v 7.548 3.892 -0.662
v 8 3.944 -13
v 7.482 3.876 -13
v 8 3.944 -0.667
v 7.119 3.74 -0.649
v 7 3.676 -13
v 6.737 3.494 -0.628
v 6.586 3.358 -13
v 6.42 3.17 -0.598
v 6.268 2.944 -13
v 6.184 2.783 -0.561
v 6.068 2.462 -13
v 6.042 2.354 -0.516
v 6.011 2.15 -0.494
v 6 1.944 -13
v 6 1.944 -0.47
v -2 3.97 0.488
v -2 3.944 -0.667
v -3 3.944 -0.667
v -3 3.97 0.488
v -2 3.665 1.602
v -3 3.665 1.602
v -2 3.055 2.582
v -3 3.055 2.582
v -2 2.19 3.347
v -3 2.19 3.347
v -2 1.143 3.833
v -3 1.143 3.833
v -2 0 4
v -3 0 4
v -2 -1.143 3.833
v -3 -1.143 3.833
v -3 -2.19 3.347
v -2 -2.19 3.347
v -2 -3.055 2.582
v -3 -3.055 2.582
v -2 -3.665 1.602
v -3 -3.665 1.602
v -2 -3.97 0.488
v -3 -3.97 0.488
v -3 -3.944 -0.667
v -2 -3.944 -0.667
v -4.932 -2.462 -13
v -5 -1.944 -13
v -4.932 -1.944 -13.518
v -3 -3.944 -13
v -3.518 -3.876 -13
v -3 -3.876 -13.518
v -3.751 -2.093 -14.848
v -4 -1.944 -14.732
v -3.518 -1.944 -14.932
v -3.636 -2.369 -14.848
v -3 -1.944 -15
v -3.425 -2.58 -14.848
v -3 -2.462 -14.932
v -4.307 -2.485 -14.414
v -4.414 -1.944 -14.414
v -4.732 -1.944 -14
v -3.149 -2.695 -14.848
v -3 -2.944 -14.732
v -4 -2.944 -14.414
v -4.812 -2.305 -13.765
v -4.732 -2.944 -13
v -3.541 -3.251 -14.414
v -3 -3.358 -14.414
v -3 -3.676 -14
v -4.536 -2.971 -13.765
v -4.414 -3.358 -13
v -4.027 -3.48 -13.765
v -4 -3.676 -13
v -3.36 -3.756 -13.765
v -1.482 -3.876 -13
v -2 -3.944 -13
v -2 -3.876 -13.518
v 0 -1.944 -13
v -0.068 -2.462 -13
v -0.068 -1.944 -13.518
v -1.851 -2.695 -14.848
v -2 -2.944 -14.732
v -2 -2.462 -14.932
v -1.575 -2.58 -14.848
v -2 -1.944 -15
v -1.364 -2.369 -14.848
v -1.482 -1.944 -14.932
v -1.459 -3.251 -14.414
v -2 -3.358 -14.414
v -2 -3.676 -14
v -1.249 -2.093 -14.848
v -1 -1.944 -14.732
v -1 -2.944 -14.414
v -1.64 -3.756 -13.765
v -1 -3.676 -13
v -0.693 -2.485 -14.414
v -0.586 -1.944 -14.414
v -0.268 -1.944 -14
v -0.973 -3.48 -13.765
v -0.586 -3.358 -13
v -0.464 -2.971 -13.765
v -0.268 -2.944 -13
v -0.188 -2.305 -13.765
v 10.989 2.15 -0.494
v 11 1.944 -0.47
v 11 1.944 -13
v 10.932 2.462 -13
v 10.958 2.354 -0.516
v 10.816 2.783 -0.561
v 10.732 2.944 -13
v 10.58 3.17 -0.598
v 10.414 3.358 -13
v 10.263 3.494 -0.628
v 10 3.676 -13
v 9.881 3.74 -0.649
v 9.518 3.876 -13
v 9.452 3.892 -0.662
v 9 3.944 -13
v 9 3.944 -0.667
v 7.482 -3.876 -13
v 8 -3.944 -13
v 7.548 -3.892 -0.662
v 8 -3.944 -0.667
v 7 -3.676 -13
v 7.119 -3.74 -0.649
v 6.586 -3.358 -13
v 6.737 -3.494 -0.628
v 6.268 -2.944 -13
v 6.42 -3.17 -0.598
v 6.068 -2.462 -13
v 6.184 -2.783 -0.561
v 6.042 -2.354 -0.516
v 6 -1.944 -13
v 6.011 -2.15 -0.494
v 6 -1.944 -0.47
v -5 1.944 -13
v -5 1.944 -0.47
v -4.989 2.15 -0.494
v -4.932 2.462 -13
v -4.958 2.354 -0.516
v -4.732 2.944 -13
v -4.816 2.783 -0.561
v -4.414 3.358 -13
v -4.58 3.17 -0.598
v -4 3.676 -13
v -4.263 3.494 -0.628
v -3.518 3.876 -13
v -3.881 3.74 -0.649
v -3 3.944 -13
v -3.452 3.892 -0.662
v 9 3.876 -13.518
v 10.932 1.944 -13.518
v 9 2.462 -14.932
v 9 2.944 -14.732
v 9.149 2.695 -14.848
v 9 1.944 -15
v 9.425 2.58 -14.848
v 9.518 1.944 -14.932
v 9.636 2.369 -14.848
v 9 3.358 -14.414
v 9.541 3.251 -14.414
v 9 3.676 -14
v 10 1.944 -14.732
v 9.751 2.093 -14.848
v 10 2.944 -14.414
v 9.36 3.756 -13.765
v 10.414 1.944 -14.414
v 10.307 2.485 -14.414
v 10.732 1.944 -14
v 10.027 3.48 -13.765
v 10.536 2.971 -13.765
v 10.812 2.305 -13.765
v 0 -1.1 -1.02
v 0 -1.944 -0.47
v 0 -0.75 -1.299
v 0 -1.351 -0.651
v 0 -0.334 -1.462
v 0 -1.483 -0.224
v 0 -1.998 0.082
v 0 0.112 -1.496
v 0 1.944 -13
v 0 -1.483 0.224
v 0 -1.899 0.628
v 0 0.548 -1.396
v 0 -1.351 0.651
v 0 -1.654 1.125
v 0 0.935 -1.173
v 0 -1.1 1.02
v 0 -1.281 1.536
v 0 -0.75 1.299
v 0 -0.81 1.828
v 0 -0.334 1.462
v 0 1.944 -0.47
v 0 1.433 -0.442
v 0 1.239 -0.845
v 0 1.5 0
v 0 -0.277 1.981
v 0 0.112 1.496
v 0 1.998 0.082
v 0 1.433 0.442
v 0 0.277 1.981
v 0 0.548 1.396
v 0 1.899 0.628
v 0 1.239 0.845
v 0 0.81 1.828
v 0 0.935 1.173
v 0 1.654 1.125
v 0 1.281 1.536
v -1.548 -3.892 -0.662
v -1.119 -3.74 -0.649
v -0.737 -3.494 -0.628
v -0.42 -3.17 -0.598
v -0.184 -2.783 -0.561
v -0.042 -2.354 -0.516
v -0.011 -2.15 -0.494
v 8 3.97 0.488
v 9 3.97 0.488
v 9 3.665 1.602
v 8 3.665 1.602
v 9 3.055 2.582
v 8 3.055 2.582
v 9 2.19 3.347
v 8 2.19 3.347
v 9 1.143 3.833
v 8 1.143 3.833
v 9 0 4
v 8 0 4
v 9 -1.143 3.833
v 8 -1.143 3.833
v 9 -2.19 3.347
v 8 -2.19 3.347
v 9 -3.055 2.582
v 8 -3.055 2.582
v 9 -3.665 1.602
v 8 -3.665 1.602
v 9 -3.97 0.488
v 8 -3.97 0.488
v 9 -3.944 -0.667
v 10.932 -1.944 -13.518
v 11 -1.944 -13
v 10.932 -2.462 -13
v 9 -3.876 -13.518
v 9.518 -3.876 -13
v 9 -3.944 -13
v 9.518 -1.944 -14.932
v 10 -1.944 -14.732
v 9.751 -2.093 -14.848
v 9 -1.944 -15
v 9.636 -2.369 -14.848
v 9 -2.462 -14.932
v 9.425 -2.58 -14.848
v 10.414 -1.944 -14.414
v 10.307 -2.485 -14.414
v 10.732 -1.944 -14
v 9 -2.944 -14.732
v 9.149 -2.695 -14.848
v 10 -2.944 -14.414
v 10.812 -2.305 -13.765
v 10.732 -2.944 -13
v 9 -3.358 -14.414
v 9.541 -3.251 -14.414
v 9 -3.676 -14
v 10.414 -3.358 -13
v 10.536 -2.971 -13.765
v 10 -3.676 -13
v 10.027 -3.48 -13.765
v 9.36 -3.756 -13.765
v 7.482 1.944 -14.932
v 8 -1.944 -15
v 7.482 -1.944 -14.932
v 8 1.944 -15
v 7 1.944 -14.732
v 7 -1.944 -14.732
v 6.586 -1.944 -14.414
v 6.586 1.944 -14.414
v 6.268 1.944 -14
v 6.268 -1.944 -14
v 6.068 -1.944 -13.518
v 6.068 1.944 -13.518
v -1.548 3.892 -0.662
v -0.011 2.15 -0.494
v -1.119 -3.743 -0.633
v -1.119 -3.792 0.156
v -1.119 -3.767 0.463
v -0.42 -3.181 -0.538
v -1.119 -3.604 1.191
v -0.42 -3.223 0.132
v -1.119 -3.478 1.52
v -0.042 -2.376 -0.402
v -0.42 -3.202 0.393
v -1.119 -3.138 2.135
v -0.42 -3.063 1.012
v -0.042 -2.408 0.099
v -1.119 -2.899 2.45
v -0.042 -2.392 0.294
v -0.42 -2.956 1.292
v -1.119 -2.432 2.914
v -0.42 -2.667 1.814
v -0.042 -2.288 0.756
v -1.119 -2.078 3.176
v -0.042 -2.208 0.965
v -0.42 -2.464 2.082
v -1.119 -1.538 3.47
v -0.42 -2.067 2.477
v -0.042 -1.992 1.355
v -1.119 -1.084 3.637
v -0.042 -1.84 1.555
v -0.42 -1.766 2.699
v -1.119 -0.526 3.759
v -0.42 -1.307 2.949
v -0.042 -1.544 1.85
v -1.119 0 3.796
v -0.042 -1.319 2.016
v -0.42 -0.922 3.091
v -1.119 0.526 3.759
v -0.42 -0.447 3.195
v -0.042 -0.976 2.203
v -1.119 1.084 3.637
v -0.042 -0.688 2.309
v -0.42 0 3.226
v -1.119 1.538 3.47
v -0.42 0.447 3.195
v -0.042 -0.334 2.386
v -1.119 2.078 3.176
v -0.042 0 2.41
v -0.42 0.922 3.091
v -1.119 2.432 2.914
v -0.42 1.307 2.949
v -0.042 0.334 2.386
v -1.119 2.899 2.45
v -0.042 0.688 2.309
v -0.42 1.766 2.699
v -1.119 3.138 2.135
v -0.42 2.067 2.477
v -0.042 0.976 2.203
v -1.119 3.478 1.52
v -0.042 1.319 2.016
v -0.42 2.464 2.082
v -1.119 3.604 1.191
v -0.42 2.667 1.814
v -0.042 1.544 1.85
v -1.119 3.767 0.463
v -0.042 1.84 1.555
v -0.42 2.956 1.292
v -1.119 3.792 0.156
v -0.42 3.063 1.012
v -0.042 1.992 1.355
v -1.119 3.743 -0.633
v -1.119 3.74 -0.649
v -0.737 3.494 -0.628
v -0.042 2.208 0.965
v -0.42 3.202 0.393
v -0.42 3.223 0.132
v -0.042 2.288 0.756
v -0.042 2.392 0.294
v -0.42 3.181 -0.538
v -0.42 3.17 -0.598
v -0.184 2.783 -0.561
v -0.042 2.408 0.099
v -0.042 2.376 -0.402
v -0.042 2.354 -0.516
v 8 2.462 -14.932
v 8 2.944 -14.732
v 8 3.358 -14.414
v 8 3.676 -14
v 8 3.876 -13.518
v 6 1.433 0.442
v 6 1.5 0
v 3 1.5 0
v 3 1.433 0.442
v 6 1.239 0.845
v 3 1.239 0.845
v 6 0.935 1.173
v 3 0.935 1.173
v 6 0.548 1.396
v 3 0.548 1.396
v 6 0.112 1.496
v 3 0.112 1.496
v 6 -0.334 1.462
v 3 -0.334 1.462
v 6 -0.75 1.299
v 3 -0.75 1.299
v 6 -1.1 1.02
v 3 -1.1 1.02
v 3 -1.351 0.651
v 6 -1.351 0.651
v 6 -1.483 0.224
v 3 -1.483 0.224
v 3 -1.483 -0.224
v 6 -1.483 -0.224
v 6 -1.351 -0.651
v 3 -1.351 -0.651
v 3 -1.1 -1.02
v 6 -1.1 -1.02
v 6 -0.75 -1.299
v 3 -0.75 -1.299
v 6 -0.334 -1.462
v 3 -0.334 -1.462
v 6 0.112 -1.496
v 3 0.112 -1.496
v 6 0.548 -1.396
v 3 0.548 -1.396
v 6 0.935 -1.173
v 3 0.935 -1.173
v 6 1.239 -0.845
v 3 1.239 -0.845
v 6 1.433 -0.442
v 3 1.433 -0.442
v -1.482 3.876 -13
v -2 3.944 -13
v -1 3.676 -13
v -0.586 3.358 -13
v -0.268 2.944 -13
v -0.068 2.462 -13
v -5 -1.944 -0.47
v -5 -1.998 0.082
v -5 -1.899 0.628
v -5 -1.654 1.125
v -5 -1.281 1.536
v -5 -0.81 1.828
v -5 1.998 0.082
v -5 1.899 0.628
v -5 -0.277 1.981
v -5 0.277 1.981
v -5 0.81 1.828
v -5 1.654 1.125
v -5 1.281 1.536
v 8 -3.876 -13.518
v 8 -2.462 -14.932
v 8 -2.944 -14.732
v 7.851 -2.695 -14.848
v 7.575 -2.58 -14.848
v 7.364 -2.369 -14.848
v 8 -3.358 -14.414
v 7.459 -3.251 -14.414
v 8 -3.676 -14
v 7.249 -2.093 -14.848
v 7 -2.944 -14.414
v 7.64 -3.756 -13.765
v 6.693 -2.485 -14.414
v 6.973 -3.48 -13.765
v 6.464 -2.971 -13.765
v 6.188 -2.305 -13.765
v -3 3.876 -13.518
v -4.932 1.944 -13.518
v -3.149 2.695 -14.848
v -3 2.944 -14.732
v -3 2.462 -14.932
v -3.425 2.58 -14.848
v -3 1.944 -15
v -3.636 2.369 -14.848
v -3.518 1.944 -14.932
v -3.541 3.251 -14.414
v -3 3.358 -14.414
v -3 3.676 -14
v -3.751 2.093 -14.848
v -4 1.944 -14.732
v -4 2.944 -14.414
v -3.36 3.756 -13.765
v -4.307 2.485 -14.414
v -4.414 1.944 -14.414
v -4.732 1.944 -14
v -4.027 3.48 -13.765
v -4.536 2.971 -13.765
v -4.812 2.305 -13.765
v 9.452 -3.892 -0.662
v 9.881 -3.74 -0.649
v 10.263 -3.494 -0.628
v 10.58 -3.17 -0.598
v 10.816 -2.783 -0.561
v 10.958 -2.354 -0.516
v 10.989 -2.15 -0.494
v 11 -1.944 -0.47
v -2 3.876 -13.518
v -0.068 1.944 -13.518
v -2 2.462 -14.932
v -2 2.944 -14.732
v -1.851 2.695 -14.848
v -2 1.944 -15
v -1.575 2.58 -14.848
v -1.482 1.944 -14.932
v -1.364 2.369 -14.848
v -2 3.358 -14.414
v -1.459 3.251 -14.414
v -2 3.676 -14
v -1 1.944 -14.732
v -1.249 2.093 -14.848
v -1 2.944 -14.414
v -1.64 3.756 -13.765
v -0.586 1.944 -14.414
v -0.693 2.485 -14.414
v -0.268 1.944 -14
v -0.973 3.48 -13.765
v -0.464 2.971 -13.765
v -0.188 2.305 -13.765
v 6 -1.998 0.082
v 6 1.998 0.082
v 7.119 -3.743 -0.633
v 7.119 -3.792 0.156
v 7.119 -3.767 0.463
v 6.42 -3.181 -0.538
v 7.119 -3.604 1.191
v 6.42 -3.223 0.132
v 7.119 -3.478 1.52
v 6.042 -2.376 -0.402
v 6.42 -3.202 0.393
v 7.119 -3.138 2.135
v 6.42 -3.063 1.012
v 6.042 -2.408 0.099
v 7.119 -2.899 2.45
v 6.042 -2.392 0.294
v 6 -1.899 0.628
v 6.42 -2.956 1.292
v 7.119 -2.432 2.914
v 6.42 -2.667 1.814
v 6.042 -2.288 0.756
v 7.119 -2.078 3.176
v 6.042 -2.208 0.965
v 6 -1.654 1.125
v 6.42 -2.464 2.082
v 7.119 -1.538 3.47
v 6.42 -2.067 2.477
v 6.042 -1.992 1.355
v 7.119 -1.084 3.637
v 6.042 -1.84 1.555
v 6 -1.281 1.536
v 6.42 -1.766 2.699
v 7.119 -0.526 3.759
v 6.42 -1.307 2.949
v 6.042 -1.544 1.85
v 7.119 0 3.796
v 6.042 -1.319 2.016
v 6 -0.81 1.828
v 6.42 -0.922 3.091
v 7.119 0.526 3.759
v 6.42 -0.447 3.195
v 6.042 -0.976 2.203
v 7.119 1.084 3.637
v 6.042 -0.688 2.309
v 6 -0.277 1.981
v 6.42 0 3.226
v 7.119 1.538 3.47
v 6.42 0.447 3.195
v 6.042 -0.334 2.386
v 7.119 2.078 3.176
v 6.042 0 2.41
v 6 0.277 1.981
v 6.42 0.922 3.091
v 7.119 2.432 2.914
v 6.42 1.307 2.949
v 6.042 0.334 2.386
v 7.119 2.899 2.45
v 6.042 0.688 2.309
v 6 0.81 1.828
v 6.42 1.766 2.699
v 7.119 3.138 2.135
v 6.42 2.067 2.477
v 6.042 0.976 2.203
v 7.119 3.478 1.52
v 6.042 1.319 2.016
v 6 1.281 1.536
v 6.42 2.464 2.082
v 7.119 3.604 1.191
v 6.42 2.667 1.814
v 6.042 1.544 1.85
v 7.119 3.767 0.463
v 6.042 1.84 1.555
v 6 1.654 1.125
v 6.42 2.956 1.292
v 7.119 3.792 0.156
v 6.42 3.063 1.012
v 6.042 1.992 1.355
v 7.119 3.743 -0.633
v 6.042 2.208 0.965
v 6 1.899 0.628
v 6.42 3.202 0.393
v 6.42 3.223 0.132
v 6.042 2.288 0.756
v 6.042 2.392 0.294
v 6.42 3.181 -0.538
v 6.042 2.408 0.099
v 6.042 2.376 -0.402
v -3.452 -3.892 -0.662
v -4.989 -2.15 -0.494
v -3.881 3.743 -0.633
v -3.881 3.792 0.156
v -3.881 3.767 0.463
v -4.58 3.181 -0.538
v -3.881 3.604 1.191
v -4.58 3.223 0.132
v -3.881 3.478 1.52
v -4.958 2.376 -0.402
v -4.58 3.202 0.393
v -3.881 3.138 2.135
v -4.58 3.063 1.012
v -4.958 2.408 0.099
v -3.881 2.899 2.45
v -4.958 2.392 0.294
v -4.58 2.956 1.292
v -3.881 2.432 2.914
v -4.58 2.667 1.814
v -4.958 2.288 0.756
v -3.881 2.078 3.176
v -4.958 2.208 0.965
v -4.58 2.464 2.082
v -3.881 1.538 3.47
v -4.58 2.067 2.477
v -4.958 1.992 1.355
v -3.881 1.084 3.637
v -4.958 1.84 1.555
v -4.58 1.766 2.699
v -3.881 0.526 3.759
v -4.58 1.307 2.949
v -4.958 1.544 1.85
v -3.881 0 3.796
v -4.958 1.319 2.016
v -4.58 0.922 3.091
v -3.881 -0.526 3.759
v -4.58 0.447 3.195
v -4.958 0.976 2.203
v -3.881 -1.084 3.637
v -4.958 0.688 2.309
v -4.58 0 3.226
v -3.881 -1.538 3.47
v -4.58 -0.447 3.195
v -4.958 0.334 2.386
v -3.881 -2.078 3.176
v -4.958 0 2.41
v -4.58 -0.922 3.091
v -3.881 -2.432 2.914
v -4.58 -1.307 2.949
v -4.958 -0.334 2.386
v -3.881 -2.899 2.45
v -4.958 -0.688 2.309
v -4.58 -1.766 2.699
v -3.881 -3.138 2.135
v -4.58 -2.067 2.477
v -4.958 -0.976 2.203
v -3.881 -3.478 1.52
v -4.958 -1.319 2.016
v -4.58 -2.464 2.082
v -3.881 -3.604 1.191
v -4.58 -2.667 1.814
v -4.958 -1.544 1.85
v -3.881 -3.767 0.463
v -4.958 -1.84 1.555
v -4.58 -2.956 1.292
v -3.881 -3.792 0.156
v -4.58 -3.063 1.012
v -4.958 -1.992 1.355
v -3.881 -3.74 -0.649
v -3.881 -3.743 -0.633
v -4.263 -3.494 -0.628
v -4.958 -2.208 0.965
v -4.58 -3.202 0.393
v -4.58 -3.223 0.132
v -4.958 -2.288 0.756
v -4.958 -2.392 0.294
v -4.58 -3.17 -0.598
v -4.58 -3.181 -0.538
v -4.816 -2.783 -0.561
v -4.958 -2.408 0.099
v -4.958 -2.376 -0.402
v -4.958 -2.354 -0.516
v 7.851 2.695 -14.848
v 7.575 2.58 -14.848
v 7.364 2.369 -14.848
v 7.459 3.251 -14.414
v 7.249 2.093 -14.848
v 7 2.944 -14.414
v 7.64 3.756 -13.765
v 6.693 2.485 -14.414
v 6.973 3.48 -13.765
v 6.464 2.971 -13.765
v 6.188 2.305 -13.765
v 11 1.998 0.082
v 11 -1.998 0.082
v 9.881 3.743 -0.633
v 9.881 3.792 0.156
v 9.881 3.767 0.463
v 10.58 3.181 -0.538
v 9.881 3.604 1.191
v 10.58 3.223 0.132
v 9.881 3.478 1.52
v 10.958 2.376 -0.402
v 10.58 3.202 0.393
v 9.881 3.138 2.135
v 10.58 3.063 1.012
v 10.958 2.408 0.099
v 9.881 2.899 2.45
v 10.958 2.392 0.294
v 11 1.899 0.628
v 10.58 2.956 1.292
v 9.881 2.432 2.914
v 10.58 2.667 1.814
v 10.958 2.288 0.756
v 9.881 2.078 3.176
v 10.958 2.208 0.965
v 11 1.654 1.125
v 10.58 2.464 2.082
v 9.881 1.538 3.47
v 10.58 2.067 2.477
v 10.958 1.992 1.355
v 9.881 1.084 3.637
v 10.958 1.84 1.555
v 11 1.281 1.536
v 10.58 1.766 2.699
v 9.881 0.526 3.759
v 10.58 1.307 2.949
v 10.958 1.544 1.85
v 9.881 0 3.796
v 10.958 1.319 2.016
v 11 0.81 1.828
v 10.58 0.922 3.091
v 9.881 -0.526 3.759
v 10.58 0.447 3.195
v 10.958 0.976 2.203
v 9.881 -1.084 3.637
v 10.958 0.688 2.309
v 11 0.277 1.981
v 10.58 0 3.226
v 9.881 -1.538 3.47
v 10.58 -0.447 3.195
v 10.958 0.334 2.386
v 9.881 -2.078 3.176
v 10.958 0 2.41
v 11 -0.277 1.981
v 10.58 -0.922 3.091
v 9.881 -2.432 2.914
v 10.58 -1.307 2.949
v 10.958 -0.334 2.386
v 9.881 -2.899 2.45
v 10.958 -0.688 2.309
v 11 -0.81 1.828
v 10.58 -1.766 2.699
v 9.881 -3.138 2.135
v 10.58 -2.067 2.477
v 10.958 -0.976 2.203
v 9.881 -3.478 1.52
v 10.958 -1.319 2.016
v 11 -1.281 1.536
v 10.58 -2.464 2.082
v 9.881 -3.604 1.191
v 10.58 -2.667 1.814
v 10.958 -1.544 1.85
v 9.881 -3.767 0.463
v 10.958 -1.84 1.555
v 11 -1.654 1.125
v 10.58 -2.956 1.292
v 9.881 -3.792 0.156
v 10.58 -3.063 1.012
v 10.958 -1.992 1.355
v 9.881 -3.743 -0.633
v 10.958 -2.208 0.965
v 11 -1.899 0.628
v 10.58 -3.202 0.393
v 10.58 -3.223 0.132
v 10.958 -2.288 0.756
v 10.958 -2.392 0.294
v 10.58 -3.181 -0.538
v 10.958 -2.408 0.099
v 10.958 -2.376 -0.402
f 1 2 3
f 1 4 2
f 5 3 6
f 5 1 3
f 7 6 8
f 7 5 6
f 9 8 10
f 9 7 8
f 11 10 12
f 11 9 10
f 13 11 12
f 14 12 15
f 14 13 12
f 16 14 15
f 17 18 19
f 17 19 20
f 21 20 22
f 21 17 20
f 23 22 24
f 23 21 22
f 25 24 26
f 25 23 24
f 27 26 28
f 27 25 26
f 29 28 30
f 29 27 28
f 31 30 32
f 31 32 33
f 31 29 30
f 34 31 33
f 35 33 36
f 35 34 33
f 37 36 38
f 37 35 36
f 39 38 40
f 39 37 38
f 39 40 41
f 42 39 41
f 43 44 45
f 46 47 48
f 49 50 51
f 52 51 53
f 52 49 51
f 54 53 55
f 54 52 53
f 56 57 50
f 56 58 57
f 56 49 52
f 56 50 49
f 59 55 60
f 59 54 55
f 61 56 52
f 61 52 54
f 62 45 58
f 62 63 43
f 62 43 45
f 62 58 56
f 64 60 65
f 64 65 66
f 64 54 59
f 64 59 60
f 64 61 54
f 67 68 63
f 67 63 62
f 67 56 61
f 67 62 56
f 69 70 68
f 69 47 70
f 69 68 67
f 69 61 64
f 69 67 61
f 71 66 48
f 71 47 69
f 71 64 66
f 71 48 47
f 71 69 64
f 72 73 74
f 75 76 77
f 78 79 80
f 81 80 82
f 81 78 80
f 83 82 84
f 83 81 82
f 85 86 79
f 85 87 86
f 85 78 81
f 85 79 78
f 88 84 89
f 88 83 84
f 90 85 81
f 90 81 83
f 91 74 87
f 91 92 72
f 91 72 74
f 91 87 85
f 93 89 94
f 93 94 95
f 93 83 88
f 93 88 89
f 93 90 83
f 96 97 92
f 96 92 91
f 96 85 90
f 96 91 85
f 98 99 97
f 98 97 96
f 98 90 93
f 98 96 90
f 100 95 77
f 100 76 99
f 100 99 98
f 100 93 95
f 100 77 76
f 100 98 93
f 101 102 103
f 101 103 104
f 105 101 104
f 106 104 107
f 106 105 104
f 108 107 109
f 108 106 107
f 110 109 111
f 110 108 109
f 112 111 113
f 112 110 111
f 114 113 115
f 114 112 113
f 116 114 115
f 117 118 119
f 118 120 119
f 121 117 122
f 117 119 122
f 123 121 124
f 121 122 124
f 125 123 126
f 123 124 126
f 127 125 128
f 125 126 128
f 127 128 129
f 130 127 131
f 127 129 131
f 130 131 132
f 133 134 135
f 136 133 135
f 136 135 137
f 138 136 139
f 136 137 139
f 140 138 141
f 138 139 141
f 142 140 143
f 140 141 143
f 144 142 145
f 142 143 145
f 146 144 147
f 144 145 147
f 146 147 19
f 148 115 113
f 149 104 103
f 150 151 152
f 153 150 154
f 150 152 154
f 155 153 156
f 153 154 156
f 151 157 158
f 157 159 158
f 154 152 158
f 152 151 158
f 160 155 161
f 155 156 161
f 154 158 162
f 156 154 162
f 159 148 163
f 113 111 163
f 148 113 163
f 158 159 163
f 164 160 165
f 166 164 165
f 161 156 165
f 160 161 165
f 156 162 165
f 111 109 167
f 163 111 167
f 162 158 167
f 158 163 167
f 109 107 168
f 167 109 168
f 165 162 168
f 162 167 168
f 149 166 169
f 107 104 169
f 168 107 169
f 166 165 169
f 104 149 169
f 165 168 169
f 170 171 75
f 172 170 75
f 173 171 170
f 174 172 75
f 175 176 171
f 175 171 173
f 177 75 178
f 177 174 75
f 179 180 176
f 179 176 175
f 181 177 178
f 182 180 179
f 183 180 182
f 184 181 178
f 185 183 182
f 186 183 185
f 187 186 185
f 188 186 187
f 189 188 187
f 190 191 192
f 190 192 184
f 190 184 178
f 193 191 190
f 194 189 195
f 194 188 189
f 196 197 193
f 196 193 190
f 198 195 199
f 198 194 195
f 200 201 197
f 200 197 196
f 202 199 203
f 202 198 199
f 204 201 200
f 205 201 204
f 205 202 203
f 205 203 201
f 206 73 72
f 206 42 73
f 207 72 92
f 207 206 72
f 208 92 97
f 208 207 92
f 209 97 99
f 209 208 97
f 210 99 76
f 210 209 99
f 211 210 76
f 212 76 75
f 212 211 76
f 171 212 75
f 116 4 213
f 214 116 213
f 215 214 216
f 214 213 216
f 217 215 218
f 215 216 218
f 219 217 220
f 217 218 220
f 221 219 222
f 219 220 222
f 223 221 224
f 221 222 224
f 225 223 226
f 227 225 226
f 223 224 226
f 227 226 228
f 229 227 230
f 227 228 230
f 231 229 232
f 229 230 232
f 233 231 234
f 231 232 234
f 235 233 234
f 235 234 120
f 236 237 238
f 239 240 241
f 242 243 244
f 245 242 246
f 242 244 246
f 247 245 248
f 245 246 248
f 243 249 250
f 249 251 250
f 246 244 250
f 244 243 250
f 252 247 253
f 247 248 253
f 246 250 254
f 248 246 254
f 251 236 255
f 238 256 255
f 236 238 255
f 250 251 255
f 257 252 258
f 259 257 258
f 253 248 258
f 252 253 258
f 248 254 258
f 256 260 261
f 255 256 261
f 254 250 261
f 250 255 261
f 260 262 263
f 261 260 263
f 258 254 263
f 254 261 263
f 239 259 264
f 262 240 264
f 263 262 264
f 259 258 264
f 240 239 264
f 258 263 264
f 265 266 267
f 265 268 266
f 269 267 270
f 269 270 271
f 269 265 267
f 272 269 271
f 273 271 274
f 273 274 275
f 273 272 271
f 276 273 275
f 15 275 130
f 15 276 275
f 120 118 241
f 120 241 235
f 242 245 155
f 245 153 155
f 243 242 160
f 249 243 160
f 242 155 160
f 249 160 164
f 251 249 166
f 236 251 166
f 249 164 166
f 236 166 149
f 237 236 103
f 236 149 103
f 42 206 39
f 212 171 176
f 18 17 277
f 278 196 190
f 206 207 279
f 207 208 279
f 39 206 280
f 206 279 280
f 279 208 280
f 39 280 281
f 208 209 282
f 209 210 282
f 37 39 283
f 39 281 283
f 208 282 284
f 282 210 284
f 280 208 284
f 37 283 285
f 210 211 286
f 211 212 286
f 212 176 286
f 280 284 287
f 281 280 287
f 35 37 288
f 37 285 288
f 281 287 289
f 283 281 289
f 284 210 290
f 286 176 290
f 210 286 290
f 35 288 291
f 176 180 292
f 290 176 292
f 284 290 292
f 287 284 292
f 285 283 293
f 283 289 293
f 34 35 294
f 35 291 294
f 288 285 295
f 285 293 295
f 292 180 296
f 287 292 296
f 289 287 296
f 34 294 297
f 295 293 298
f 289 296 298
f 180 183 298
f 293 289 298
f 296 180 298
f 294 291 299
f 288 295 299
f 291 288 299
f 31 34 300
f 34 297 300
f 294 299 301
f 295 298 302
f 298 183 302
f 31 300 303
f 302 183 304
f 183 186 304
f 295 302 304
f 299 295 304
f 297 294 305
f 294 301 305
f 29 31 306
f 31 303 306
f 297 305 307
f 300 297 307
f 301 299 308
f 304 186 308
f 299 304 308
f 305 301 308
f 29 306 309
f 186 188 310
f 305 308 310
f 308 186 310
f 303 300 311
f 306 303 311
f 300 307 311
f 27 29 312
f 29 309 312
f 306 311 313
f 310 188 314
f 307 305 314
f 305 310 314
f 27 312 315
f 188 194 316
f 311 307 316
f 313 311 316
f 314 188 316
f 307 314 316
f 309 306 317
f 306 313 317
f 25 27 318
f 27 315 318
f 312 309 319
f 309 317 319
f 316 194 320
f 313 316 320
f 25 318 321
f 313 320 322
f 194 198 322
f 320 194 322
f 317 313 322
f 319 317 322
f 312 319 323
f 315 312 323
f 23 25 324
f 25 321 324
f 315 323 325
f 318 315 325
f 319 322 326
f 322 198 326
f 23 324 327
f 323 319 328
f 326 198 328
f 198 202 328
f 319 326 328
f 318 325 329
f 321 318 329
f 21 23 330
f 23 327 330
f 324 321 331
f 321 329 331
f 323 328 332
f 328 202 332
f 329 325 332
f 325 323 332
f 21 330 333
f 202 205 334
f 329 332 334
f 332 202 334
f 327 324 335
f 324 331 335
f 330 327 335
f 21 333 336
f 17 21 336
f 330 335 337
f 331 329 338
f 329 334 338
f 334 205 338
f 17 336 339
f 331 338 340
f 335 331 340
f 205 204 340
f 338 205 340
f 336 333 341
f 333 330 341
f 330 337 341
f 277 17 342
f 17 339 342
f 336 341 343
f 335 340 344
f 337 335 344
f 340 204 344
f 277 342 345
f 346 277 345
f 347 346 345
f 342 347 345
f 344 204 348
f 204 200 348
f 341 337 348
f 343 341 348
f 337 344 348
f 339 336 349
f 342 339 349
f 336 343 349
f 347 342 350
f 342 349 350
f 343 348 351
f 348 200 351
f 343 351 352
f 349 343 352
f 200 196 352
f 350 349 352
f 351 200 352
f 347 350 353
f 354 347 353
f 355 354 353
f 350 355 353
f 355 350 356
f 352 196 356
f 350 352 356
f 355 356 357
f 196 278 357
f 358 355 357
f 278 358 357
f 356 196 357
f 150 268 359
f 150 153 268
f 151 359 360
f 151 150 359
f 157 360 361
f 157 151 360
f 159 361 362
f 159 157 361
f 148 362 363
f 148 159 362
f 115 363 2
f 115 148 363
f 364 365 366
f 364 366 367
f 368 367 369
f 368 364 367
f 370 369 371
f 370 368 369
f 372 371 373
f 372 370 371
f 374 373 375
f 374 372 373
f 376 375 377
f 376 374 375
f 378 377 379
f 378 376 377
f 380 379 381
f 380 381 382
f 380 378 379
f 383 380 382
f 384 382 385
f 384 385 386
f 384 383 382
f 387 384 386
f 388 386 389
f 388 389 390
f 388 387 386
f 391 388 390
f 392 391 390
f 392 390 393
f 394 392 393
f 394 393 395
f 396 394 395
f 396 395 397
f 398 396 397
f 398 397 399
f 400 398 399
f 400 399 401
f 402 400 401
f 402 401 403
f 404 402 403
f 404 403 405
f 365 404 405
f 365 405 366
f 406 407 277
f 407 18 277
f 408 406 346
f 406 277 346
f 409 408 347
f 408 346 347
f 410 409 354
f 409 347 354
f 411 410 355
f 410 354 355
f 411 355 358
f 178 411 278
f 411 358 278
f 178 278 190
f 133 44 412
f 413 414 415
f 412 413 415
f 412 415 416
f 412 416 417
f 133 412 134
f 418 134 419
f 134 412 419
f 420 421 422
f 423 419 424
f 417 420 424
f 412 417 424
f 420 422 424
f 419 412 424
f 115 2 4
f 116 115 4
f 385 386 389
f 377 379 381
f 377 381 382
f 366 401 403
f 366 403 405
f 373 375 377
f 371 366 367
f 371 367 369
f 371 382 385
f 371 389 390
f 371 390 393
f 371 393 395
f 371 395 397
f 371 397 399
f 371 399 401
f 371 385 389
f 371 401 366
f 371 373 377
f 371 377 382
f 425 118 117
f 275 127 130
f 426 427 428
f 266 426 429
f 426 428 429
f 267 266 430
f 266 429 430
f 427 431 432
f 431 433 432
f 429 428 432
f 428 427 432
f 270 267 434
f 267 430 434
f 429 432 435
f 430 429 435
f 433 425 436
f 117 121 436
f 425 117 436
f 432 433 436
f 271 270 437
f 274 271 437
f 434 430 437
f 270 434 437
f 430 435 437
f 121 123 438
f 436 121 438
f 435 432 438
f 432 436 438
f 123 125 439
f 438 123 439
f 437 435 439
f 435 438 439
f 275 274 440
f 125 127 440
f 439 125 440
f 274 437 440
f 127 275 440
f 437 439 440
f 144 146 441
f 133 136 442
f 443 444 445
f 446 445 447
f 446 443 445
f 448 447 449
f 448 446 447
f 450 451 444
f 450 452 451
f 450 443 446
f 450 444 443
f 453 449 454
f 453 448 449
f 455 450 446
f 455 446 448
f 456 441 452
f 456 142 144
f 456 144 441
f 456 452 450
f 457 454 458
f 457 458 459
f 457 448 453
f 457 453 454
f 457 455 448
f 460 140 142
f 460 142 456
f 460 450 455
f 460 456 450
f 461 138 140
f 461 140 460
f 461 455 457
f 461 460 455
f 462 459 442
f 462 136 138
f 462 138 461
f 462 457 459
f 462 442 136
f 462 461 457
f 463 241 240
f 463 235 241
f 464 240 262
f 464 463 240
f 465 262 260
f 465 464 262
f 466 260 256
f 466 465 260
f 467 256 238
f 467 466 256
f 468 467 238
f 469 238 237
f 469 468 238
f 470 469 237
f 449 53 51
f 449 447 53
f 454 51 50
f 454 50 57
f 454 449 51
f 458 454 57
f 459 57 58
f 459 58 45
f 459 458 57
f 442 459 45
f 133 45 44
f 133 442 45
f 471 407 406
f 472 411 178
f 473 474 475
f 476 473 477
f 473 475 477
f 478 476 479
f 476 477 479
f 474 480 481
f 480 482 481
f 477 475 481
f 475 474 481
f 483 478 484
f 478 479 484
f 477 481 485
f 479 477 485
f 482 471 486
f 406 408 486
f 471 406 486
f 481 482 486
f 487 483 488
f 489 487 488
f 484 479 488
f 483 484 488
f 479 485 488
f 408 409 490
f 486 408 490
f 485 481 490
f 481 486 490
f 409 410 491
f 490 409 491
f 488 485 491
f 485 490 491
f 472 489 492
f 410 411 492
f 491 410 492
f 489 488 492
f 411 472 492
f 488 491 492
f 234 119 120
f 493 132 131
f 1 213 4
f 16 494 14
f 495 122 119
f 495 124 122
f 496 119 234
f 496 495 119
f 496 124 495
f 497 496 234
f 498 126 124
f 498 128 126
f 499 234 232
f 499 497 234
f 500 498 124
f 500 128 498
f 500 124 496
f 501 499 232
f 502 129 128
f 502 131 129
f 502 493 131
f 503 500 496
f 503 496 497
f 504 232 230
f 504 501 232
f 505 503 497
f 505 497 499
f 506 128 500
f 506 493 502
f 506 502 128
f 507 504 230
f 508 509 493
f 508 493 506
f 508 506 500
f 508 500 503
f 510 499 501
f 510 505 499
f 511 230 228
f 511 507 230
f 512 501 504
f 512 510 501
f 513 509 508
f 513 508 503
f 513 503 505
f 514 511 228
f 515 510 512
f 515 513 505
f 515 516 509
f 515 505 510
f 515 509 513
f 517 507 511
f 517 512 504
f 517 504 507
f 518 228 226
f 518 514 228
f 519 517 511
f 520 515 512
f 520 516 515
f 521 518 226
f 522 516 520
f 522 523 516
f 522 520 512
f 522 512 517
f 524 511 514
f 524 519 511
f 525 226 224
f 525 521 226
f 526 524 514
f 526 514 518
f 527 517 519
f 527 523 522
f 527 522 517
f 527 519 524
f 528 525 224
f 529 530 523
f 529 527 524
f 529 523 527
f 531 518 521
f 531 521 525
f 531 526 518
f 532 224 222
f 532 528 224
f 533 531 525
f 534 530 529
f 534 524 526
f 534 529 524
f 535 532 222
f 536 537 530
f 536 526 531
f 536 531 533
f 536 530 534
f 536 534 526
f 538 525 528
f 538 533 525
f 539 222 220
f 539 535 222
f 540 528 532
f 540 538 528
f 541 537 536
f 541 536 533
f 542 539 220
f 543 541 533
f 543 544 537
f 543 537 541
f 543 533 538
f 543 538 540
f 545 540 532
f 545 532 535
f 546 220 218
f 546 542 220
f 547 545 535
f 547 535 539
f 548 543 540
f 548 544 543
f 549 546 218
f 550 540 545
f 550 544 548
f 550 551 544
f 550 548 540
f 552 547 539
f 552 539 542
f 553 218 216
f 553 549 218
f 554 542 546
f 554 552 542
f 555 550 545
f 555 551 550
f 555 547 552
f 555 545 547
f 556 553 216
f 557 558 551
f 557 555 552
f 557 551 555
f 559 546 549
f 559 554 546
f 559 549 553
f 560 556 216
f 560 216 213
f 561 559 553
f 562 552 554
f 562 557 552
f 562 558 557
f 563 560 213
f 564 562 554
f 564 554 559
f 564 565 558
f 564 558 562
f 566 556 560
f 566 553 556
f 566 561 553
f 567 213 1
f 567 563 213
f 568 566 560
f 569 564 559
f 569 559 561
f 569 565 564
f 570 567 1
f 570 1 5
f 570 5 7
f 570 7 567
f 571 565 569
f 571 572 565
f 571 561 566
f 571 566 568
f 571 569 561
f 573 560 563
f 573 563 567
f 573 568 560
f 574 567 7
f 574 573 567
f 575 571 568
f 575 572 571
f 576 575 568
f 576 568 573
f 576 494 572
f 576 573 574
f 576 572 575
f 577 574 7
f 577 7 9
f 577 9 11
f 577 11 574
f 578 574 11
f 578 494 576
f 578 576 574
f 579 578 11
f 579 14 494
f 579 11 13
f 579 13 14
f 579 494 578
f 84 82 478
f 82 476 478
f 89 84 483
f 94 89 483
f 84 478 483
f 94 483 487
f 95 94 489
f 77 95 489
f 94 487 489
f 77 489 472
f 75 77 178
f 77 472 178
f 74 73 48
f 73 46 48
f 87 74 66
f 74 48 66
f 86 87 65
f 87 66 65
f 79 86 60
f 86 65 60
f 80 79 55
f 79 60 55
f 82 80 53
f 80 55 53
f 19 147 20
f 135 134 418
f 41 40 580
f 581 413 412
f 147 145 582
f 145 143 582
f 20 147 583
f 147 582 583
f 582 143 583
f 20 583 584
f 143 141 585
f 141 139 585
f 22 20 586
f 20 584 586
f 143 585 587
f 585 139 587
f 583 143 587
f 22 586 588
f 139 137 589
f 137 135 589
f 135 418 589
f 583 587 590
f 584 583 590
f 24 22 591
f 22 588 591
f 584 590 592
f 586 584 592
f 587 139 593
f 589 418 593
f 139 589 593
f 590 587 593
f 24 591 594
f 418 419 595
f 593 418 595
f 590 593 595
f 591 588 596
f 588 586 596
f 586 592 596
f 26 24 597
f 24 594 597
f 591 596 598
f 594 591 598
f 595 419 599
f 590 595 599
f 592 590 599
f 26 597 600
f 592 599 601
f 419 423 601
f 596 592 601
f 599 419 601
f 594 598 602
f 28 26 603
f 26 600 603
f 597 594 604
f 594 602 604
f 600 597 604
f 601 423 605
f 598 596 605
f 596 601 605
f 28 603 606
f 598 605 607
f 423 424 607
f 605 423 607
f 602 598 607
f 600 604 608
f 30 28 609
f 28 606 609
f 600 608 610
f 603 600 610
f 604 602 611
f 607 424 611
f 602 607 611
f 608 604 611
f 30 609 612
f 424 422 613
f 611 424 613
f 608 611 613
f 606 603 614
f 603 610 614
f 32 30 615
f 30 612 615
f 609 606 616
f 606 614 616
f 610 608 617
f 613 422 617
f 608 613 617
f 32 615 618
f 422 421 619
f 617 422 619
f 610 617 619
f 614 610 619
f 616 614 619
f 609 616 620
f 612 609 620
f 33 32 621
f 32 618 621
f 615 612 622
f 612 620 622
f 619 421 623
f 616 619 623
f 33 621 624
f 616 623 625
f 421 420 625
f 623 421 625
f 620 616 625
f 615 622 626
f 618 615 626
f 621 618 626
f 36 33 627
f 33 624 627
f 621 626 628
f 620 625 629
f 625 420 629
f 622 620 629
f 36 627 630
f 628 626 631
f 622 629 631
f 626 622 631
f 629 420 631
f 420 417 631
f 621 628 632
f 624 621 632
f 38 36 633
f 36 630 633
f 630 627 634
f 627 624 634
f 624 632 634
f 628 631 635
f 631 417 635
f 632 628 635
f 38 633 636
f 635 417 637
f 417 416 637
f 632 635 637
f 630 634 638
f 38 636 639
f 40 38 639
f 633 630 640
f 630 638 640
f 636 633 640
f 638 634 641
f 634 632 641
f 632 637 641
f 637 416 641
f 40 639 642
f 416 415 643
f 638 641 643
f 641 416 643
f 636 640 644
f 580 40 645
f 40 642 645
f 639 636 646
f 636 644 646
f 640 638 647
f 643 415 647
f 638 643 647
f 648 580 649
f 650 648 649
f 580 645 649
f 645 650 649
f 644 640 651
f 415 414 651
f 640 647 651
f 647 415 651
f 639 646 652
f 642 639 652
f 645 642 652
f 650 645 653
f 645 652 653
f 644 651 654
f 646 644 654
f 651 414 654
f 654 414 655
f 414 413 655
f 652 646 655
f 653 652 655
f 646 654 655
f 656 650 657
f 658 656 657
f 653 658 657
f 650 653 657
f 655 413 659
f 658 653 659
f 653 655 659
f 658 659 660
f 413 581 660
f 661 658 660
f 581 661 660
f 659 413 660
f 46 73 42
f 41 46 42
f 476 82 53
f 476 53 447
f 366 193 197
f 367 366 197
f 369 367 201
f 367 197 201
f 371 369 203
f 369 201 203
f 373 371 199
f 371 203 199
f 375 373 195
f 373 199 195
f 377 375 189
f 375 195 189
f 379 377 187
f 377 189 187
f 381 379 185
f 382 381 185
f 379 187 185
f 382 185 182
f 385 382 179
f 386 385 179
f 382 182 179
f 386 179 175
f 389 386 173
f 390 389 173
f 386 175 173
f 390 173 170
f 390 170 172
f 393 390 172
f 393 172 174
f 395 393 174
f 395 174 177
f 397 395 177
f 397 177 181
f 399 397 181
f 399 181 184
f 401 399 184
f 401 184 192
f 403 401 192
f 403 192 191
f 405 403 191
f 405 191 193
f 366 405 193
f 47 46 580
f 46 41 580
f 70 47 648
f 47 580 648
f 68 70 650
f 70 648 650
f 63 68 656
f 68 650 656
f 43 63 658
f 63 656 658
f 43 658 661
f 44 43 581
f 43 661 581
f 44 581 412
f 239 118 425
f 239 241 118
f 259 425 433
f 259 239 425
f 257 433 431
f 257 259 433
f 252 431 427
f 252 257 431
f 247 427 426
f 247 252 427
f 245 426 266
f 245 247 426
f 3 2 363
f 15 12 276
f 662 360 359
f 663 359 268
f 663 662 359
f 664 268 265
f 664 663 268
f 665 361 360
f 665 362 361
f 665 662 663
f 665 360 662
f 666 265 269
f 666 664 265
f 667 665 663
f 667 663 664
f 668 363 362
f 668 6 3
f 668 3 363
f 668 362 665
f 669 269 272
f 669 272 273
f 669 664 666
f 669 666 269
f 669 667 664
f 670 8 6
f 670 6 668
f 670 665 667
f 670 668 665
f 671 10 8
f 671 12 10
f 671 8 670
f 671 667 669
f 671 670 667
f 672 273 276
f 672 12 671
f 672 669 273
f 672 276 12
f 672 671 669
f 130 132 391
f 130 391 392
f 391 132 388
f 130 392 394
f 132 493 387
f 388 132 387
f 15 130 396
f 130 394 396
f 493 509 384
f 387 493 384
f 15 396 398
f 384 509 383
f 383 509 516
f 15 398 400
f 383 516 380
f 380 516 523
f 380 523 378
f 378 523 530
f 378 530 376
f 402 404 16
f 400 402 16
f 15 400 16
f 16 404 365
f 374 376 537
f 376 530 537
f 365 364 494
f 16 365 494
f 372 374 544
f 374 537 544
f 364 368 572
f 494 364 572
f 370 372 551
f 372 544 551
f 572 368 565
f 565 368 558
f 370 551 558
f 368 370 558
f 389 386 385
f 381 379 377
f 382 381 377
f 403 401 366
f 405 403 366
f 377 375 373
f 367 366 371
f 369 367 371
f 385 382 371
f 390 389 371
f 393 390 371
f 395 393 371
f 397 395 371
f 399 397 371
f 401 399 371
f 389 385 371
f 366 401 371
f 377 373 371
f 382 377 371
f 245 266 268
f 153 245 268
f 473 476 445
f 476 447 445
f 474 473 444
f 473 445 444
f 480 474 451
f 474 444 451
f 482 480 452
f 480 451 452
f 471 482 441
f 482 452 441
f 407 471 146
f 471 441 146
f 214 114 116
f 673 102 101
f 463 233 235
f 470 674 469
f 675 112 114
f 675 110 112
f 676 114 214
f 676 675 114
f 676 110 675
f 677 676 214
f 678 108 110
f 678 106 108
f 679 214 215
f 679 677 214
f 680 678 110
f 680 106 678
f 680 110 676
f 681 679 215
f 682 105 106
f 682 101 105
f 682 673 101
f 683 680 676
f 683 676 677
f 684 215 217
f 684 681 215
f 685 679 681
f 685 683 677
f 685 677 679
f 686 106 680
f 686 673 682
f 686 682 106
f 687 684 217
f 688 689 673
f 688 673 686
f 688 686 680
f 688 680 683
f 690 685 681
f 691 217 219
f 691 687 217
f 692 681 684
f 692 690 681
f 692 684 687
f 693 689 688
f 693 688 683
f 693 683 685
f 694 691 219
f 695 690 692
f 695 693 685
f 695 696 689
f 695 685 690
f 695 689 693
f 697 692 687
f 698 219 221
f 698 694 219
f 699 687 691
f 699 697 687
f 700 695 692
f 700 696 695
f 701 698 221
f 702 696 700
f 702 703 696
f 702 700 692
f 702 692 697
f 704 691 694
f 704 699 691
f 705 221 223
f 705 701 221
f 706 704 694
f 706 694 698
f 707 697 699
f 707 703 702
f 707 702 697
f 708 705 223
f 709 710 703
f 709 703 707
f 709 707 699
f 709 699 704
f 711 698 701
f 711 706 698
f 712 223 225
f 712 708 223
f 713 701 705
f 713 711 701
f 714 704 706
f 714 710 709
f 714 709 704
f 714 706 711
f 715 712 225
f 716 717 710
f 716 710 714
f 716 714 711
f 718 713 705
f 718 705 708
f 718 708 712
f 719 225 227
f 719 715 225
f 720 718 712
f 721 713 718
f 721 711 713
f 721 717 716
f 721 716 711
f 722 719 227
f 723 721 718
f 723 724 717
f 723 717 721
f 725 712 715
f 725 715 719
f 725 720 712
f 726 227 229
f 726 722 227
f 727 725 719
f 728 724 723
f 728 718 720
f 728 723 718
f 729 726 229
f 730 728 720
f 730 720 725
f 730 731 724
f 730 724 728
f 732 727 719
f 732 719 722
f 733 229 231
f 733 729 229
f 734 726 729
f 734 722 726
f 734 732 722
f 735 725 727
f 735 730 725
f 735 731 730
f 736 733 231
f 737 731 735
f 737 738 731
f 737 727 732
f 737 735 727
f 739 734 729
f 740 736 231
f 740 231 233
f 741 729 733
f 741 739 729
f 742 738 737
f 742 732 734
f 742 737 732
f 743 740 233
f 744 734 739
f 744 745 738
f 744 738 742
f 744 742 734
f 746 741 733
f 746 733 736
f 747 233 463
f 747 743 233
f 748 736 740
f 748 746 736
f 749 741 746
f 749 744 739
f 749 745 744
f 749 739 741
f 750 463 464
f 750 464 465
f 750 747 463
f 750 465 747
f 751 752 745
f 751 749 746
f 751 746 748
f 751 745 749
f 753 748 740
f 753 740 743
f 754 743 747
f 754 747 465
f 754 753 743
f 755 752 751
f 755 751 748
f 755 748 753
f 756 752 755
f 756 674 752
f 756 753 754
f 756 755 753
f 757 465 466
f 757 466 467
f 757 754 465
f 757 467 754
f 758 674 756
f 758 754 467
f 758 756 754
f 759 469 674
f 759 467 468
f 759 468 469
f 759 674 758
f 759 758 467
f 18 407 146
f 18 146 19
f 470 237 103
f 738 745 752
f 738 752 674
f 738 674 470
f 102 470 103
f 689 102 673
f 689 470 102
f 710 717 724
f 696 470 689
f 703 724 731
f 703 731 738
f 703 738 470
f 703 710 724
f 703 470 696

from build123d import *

# Parameters (mm, degrees)
F0_R     = 1.5
F1_DEPTH = 3
F2_R     = 4
F3_W     = 7.888094809
F3_H     = 15
F4_DEPTH = 5
F5_R     = 2
F6_R     = 1.99999


# Not quite as in the source:
# - a fillet or chamfer is up to 0.001 mm smaller than in the source, because OpenCascade refuses the exact size


with BuildPart() as f1:
    # F0 (on Right) → F1 (new body)
    with BuildSketch(Plane.YZ):
        Circle(F0_R)
    extrude(amount=F1_DEPTH)

    # F2 (on Right) + F3 (on Right) → F4 (join)
    with BuildSketch(Plane.YZ):
        Circle(F2_R)
    with BuildSketch(Plane.YZ):
        with Locations((0, -7.5)):
            Rectangle(F3_W, F3_H)
    extrude(amount=-F4_DEPTH)

    # F5
    f5_edges = [f1.edges().sort_by_distance(p)[0] for p in [
        (-5, -3.944047, -7.83335),
        (0, -3.944047, -7.83335),
        (0, 3.944047, -7.83335),
        (-5, 3.944047, -7.83335),
        (-2.5, 3.944047, -15),
        (-5, 0, -15),
        (-2.5, -3.944047, -15),
        (0, 0, -15),
    ]]
    fillet(f5_edges, radius=F5_R)

    # F6 (radius 2 in the source; OpenCascade refuses exactly that, so slightly less here)
    f6_edges = [f1.edges().sort_by_distance(p)[0] for p in [
        (-5, 0, 4),
        (0, 0, 4),
    ]]
    fillet(f6_edges, radius=F6_R)


with BuildPart() as f7_1:
    # F7: instance of F1
    add(f1.part.mirror(Plane.YZ.offset(3)))


solid = Compound([f1.part, f7_1.part])
